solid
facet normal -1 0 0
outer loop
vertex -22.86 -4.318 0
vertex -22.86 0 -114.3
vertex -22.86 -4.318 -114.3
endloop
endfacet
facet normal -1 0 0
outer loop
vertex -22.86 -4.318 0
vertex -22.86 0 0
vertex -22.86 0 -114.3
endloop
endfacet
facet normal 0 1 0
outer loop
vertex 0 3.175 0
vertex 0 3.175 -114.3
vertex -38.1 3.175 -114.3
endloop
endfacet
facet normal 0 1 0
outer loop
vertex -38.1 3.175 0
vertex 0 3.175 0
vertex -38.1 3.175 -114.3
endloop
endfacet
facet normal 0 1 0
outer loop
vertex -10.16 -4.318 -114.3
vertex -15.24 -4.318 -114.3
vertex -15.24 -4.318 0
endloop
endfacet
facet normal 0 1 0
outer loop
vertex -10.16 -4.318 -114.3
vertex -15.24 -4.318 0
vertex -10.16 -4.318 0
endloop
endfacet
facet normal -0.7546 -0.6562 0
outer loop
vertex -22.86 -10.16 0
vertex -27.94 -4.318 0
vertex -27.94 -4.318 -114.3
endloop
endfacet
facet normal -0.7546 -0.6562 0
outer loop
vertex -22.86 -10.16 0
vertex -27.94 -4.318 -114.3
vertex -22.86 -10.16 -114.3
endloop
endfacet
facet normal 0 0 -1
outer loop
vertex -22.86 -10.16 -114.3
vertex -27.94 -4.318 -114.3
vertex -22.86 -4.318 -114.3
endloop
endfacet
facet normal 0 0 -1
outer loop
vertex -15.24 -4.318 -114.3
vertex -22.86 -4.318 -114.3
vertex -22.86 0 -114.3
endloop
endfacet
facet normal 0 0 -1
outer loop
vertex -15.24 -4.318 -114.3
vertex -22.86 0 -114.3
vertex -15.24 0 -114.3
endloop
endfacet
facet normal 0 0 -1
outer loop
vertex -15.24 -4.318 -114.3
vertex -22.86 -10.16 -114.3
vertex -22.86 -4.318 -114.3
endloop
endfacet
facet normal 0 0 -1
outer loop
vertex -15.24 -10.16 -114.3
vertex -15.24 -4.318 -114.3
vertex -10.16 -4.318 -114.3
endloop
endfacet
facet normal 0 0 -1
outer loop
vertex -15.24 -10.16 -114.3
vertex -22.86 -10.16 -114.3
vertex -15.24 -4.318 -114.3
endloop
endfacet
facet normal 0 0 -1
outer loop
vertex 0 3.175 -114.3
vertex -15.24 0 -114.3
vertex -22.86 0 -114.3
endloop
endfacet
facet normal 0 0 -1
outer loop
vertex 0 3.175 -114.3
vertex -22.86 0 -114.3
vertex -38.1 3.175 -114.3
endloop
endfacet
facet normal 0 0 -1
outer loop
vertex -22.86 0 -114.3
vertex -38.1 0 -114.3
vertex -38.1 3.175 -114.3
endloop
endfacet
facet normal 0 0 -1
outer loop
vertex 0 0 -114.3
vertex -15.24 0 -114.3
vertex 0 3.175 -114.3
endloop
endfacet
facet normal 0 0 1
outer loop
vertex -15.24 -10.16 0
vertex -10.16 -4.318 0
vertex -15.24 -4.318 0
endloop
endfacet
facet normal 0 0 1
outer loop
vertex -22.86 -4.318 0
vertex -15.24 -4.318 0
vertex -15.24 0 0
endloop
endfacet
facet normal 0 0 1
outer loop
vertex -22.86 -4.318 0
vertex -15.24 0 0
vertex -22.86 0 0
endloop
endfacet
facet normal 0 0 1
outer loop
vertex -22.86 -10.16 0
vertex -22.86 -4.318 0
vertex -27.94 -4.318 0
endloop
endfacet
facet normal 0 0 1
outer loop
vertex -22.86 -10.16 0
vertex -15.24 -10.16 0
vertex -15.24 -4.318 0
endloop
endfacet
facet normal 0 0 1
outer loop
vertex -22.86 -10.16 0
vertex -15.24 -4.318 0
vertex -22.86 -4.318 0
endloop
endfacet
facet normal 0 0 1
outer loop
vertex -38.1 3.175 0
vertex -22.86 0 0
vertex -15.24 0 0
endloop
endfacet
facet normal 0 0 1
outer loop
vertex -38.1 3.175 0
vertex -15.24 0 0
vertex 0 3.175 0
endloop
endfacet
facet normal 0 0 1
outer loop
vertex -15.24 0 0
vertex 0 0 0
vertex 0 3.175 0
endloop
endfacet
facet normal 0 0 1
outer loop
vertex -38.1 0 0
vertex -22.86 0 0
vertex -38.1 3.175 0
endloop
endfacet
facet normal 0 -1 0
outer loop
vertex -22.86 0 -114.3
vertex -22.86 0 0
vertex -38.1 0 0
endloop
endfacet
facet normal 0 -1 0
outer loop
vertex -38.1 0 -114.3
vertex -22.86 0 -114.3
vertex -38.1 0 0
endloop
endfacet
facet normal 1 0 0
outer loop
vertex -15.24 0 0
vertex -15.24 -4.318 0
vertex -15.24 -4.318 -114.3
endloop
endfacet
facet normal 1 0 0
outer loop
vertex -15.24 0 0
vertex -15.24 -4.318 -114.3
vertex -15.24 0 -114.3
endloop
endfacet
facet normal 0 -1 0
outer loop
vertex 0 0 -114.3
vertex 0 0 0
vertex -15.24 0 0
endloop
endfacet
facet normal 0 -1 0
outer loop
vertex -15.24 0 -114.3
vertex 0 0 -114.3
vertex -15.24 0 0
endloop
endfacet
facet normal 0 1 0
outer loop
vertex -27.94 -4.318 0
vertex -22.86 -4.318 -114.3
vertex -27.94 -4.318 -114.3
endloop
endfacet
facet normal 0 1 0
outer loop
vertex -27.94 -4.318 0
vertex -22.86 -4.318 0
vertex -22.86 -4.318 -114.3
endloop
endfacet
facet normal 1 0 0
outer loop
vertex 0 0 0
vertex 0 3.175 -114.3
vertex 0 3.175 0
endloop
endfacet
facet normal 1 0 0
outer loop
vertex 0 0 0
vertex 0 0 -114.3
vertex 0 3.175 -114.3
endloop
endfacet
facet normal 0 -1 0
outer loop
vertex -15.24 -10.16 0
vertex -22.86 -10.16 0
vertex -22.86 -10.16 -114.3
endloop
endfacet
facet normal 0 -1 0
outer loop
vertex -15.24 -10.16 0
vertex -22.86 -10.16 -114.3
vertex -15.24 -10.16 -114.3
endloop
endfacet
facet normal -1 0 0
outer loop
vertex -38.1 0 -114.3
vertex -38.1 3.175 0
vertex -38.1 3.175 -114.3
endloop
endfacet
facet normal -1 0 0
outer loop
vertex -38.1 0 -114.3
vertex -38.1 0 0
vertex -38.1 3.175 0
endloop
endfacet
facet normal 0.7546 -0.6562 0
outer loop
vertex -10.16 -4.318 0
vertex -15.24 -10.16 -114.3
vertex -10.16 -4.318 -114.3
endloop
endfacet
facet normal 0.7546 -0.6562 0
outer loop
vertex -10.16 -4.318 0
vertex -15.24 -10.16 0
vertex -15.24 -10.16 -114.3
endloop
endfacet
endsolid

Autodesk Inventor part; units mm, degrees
ref_plane "YZ Plane" through (0, 0, 0) normal (1, 0, 0) x (0, 1, 0)
ref_plane "XZ Plane" through (0, 0, 0) normal (0, 1, 0) x (-1, 0, 0)
ref_plane "XY Plane" through (0, 0, 0) normal (0, 0, 1) x (1, 0, 0)
sketch "Sketch1" plane through (0, 0, 0) normal (0, 1, 0) x (-1, 0, 0)
  line L0 (0, 0) -> (38.1, 0)
  line L1 (38.1, 0) -> (38.1, -114.3)
  line L2 (38.1, -114.3) -> (0, -114.3)
  line L3 (0, -114.3) -> (0, 0)
  dimension "d0" = 38.1
  dimension "d1" = 114.3
extrude "Extrusion1" add sketch "Sketch1" along normal blind 3.175
sketch "Sketch2" plane through (-38.1, 0, 0) normal (0, 0, 1) x (1, 0, 0)
  line L0 (38.1, 0) -> (0, 0) projected
  line L1 (15.24, 0) -> (15.24, -4.318)
  line L2 (22.86, -4.318) -> (22.86, 0)
  line L3 (15.24, 0) -> (22.86, 0)
  line L4 (0, 0) -> (0, 3.175) projected
  line L5 (38.1, 0) -> (38.1, 3.175) projected
  line L6 (22.86, -4.318) -> (27.94, -4.318)
  line L7 (15.24, -4.318) -> (10.16, -4.318)
  line L8 (10.16, -4.318) -> (15.24, -10.16)
  line L9 (15.24, -10.16) -> (22.86, -10.16)
  line L10 (22.86, -10.16) -> (27.94, -4.318)
  dimension "d4" = 15.24
  dimension "d5" = 15.24
  dimension "d7" = 5.08
  dimension "d8" = 5.08
  dimension "d9" = 7.62
  dimension "d10" = 10.16
extrude "Extrusion2" add sketch "Sketch2" against normal blind 114.3
properties part number "railMount_4.5inch"
